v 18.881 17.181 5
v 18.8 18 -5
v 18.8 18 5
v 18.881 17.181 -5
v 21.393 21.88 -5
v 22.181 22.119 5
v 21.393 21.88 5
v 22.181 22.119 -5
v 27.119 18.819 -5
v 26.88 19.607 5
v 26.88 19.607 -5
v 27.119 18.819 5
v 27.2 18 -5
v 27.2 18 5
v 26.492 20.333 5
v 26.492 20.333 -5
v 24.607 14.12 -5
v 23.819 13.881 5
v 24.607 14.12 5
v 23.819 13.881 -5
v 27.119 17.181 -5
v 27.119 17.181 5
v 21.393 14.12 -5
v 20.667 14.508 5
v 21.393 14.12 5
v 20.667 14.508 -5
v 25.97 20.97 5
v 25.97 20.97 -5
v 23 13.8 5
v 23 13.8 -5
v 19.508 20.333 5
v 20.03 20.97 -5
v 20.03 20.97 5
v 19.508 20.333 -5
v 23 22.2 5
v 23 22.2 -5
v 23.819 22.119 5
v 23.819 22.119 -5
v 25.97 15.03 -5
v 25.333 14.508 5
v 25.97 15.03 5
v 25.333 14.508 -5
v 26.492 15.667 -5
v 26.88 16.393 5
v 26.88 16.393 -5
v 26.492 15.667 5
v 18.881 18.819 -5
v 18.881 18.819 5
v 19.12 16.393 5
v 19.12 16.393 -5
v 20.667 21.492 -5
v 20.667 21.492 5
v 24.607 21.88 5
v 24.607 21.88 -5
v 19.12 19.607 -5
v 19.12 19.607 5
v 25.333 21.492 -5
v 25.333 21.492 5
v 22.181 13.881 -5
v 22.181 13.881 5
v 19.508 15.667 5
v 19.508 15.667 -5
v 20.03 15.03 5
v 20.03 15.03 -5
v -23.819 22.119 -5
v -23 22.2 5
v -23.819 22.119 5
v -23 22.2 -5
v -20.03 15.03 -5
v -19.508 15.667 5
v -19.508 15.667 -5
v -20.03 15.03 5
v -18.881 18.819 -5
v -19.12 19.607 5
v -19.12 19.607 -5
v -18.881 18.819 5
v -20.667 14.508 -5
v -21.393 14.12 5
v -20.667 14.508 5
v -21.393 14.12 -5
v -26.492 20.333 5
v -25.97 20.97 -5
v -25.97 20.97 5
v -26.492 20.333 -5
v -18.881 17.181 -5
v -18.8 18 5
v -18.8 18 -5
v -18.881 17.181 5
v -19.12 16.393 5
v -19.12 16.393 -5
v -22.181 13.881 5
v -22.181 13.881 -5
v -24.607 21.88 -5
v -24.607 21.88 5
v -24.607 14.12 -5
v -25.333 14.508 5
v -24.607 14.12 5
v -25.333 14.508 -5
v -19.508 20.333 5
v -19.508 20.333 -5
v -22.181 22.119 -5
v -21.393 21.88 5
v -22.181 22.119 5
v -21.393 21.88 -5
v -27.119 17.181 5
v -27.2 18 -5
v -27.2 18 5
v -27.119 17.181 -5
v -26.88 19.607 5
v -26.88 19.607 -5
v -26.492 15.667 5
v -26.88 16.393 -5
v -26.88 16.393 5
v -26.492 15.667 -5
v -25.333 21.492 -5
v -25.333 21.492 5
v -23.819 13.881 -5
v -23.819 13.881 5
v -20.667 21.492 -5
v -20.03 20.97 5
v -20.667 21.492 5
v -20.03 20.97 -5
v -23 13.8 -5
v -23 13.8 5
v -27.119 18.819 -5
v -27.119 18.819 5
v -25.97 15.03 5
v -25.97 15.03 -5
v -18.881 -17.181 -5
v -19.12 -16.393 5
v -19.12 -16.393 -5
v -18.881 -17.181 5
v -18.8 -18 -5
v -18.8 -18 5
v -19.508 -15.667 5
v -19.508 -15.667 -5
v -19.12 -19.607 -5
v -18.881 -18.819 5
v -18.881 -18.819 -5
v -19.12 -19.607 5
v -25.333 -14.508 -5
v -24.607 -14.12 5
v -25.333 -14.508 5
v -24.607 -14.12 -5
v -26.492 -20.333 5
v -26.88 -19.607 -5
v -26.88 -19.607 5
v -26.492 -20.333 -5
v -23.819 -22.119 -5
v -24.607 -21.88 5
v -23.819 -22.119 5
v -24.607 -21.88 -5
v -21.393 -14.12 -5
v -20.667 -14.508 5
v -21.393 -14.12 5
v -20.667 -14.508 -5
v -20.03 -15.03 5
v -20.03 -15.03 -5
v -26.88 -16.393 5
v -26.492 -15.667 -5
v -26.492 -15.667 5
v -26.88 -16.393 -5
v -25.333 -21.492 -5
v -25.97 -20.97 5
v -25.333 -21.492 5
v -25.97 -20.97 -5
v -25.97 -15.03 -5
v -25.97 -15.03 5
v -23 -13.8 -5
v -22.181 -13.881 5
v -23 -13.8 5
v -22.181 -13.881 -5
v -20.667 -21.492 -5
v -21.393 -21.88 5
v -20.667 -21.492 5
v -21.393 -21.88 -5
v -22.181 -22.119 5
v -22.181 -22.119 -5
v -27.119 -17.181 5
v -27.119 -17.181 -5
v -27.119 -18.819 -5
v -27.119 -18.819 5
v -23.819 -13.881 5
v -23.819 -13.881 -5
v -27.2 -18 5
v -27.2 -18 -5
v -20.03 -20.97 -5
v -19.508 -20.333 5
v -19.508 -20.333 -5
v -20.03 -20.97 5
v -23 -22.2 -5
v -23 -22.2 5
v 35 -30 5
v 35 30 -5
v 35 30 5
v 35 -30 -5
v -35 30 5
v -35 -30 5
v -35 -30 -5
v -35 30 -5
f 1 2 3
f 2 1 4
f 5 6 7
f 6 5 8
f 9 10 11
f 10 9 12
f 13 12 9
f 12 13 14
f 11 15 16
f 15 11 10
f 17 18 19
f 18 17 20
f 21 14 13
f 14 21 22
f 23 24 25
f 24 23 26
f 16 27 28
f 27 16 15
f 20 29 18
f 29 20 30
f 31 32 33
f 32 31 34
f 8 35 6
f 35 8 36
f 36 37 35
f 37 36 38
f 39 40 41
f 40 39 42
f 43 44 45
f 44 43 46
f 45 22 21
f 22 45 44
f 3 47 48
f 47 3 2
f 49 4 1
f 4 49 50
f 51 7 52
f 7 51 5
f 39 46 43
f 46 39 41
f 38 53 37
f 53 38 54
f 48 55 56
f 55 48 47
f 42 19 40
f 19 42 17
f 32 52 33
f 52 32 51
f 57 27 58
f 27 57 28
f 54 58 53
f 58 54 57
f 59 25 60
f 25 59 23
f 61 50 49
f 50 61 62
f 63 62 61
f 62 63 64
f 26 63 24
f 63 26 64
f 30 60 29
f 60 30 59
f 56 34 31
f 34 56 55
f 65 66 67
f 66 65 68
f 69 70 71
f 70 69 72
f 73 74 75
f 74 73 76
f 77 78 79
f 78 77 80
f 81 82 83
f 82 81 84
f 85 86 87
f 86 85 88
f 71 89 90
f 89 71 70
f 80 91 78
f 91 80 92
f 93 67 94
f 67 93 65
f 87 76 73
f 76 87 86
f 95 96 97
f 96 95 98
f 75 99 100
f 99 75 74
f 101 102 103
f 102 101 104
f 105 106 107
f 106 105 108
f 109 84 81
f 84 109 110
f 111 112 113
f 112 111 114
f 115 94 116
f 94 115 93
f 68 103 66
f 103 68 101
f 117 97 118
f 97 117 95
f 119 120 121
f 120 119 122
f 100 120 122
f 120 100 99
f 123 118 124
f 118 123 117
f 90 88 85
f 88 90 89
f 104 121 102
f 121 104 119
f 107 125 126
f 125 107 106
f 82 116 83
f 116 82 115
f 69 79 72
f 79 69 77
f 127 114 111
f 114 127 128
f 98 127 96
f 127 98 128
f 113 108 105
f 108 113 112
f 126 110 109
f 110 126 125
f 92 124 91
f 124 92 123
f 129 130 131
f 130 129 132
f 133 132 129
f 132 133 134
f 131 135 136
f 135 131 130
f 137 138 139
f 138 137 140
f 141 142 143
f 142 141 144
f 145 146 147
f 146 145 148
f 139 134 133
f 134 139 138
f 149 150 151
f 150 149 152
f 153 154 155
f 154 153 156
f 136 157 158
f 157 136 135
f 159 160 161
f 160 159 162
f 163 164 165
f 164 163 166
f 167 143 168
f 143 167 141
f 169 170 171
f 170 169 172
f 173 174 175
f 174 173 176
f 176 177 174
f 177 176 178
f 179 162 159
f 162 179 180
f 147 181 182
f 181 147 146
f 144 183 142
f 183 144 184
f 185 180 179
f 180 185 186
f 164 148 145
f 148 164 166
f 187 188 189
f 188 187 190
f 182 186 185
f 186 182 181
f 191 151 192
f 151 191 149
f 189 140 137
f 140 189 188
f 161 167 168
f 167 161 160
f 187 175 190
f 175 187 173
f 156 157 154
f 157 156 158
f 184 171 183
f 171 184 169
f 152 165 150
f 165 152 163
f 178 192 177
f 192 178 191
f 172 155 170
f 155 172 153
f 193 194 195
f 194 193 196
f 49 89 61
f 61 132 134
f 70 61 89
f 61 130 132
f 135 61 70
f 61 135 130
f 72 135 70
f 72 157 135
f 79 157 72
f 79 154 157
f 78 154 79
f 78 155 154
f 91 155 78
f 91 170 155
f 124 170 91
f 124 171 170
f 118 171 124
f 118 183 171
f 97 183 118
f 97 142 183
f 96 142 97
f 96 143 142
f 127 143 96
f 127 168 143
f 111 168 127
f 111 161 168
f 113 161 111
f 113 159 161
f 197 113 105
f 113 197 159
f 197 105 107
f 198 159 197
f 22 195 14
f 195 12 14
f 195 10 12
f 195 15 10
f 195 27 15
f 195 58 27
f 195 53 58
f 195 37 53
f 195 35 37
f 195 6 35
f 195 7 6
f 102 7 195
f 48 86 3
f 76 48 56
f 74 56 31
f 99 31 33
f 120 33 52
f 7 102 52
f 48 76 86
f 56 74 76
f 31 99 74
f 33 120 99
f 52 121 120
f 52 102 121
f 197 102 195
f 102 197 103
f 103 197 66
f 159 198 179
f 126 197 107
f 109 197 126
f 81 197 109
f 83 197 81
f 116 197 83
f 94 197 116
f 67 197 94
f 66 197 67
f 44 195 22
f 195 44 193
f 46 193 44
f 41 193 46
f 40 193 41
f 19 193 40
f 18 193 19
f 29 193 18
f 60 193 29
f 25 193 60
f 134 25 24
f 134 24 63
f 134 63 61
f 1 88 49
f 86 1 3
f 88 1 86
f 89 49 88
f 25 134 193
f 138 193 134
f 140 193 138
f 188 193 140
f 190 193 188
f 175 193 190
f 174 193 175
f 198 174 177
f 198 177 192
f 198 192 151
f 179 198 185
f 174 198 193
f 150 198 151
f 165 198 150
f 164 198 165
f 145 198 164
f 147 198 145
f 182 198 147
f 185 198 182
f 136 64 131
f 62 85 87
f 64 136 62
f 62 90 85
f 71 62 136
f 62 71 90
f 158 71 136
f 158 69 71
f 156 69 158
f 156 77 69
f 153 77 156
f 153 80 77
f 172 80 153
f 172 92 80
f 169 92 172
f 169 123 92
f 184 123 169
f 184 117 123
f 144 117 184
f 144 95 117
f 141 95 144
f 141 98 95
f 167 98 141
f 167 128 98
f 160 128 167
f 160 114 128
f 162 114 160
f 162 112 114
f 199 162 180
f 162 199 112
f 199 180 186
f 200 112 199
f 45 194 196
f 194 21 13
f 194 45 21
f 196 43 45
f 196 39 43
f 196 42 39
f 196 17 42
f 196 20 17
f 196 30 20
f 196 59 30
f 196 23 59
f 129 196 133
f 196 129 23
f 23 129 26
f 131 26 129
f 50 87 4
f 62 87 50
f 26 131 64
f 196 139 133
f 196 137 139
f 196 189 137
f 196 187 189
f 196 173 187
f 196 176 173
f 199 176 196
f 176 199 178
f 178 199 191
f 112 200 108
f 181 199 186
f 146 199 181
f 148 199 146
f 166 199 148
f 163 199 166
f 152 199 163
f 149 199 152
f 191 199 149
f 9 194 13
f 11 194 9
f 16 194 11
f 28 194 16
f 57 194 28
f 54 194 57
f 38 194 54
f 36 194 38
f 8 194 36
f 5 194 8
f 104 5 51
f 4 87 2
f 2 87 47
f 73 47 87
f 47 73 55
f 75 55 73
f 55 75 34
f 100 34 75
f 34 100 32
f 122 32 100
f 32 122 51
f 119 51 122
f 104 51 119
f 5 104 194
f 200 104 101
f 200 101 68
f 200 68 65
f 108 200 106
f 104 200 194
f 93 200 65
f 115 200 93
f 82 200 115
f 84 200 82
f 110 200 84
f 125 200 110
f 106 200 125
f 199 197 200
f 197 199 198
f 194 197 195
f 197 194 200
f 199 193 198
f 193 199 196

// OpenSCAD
$fn = 32;

// ----------------------------------------------------------------------
// Corner plate 70 x 60 x 10
// 3 holes, centres taken from the edge offset
// ----------------------------------------------------------------------

// --- parameters (mm) ---
plate = [70, 60, 10];  // overall size (x, y, z)
holes = 3;             // number of holes the drawing asks for
hole_d = 8.4;          // hole diameter
edge = 12;             // hole centre offset from the plate edge

// --- derived feature positions (mm) ---
corner_x = plate[0] / 2 - edge;  // = 23   corner hole X
corner_y = plate[1] / 2 - edge;  // = 18   corner hole Y
feature_centers = [
  [corner_x, corner_y],
  [-corner_x, corner_y],
  [-corner_x, -corner_y]
];   // hole centres the loop below drills

// plate outline, every hole drilled through with the same cutters
difference() {
  cube(plate, center = true);
  for (centre = feature_centers)
    translate([centre[0], centre[1], 0])
      cylinder(d = hole_d, h = plate[2] + 2, center = true);
}
